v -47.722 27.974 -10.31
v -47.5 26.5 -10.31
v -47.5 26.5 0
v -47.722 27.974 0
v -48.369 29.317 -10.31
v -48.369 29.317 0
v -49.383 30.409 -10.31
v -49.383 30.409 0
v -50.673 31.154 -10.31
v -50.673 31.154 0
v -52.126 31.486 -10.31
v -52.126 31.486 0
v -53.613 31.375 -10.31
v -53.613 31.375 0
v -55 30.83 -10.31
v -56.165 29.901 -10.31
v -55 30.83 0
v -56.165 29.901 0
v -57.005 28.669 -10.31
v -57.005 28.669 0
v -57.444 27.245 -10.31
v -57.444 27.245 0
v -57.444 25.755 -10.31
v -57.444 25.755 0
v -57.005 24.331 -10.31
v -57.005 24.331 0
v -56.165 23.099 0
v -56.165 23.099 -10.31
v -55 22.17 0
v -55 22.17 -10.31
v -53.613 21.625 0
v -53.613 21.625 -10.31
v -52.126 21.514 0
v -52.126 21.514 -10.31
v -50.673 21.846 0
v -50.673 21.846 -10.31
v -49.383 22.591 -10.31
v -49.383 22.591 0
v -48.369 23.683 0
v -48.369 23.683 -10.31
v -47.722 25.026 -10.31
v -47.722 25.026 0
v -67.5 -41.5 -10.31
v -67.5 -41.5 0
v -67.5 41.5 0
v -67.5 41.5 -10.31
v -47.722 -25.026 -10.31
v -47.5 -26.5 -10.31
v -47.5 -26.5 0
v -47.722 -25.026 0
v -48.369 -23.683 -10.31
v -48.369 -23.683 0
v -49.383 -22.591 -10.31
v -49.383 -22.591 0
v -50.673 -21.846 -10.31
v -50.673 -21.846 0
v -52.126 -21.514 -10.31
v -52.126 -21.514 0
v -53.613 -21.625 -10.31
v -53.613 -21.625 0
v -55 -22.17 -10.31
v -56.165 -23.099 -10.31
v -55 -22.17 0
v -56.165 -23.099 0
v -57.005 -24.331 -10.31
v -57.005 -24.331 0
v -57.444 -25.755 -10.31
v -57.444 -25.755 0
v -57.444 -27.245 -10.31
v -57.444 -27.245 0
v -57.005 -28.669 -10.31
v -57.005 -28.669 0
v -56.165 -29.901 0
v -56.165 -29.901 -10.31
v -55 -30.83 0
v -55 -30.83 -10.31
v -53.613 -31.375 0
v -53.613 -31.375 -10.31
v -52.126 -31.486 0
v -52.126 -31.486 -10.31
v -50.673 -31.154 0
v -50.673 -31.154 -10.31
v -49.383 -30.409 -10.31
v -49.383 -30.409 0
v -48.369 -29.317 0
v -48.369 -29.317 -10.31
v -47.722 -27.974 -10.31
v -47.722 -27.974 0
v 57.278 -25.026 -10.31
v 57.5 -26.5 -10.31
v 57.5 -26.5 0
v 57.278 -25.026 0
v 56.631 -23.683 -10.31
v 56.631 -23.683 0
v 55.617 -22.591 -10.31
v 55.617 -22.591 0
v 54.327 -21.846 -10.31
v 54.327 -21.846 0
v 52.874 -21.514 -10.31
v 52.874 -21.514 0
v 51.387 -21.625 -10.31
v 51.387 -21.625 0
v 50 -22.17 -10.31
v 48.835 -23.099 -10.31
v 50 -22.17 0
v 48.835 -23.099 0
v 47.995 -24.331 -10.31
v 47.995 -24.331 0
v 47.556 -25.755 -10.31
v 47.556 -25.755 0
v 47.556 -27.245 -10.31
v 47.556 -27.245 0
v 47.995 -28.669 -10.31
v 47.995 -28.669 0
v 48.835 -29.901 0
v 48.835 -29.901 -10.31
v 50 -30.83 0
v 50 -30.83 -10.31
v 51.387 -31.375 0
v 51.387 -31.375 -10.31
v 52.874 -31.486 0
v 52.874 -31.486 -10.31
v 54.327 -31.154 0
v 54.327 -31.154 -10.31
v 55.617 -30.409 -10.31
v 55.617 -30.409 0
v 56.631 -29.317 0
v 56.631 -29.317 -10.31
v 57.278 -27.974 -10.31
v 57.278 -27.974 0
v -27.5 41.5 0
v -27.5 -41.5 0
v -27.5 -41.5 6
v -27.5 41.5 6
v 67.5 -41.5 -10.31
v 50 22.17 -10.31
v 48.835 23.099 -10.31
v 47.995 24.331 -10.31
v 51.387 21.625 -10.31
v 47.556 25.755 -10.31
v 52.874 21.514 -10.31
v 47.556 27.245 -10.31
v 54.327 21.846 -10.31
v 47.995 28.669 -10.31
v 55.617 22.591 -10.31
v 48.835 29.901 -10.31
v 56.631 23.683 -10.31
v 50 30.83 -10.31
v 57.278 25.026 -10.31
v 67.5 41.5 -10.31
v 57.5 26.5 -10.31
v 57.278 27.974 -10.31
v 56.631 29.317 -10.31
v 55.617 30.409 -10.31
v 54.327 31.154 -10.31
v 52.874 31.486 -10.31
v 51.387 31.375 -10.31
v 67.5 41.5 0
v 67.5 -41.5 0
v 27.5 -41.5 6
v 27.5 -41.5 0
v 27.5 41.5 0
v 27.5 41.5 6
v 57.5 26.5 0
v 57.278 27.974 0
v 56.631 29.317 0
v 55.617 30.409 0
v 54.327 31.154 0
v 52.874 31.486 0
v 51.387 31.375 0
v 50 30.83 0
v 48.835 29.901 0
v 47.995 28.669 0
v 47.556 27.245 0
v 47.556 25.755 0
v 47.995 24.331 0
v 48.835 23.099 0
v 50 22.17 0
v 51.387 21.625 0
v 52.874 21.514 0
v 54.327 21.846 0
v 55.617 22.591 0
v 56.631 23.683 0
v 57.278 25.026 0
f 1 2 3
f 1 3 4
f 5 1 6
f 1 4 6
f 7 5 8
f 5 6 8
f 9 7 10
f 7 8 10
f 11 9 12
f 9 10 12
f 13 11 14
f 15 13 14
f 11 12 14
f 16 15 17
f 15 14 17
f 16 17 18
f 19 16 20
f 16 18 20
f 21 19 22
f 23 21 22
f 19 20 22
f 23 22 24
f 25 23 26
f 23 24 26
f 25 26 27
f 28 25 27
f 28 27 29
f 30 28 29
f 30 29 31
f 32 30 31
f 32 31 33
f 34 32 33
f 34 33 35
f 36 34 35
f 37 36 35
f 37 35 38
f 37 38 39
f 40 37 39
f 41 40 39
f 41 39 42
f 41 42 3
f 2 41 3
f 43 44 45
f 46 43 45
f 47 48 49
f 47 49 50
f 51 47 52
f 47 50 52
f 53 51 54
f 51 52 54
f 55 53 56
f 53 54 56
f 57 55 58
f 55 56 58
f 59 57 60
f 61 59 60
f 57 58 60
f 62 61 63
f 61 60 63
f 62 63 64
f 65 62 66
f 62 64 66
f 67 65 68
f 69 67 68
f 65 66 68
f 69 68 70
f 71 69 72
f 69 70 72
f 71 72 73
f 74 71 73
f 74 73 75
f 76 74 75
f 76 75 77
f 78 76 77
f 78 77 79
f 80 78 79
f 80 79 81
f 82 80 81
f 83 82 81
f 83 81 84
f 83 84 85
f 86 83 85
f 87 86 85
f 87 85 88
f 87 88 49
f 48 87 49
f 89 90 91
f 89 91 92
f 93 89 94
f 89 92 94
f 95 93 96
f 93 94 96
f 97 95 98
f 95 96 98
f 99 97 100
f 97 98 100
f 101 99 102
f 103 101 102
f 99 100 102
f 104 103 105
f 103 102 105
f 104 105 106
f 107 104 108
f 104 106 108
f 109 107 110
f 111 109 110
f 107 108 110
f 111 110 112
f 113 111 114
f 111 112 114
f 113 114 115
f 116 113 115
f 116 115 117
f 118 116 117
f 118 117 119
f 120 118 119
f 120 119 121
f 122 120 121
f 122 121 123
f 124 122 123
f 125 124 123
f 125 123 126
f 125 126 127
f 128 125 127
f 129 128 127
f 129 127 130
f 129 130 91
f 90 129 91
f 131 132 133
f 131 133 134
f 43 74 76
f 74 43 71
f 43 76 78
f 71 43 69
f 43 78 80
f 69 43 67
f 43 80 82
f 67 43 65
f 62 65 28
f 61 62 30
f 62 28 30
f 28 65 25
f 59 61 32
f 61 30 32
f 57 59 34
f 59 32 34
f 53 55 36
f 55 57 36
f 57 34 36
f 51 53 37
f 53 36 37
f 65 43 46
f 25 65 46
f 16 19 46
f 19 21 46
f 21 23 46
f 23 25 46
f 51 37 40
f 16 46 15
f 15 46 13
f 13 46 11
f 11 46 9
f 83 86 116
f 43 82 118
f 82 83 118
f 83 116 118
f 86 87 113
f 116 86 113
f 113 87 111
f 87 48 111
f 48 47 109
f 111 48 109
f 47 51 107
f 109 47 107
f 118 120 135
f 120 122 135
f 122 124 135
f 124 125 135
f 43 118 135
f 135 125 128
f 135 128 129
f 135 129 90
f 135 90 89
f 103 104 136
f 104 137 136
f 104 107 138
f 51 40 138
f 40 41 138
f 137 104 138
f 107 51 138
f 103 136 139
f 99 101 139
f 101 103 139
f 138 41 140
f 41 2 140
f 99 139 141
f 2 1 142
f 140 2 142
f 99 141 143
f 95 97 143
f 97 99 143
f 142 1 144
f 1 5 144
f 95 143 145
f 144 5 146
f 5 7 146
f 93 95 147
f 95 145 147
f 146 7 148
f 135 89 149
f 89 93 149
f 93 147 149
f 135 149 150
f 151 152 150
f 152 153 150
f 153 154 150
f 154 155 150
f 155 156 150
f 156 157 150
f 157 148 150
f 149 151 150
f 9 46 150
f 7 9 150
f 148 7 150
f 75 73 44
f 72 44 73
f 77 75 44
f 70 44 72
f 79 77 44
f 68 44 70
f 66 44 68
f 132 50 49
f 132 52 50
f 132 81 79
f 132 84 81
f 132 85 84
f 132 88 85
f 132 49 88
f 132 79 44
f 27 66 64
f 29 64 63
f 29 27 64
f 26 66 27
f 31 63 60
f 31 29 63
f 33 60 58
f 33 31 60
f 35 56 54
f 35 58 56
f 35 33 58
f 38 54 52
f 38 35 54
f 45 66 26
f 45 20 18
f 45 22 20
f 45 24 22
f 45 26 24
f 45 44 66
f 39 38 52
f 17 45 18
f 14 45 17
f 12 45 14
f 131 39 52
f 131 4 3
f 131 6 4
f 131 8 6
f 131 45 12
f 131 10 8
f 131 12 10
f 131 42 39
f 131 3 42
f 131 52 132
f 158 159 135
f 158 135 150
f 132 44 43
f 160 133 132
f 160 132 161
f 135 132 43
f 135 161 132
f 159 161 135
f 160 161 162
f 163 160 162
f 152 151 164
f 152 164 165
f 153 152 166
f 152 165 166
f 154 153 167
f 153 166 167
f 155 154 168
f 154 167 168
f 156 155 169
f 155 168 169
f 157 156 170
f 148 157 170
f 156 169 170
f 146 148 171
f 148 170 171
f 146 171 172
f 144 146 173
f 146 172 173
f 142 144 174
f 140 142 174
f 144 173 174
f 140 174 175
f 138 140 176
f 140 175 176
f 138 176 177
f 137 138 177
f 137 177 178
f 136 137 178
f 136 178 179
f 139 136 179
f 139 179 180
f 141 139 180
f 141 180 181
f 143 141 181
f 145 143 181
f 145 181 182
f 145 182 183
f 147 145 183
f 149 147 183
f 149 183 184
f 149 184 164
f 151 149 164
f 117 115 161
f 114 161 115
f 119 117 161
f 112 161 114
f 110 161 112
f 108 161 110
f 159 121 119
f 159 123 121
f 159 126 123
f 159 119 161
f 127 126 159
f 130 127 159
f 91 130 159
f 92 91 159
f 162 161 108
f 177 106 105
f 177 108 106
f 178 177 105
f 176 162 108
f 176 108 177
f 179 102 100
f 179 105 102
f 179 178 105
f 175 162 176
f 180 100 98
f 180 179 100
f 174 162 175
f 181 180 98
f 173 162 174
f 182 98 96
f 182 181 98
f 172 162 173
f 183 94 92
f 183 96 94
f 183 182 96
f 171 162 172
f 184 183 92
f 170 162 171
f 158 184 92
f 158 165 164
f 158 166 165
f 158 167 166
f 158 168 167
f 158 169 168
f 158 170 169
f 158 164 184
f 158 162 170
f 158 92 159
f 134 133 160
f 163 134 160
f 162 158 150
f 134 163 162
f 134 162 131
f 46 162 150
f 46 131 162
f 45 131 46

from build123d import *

# Parameters (mm, degrees)
F0_W     = 40
F0_H     = 83
F0_W_2   = 55
F1_DEPTH = 10.31
F2_R     = 5
F3_DEPTH = 10.311
F4_DEPTH = 6


with BuildPart() as f1:
    # F0 (on Top) → F1 (new body)
    with BuildSketch(Plane.XY):
        with Locations((-47.5, 0)):
            Rectangle(F0_W, F0_H)
        Rectangle(F0_W_2, F0_H)
        with Locations((47.5, 0)):
            Rectangle(F0_W, F0_H)
    extrude(amount=-F1_DEPTH)

    # F2 (on face) → F3 (cut, through all)
    with BuildSketch(Plane.XY):
        with Locations((52.5, 26.5)):
            Circle(F2_R)
        with Locations((52.5, -26.5)):
            Circle(F2_R)
        with Locations((-52.5, 26.5)):
            Circle(F2_R)
        with Locations((-52.5, -26.5)):
            Circle(F2_R)
    extrude(amount=-F3_DEPTH, mode=Mode.SUBTRACT)

    # F0 (on Top) → F4 (join)
    with BuildSketch(Plane.XY):
        Rectangle(F0_W_2, F0_H)
    extrude(amount=F4_DEPTH)


solid = f1.part
